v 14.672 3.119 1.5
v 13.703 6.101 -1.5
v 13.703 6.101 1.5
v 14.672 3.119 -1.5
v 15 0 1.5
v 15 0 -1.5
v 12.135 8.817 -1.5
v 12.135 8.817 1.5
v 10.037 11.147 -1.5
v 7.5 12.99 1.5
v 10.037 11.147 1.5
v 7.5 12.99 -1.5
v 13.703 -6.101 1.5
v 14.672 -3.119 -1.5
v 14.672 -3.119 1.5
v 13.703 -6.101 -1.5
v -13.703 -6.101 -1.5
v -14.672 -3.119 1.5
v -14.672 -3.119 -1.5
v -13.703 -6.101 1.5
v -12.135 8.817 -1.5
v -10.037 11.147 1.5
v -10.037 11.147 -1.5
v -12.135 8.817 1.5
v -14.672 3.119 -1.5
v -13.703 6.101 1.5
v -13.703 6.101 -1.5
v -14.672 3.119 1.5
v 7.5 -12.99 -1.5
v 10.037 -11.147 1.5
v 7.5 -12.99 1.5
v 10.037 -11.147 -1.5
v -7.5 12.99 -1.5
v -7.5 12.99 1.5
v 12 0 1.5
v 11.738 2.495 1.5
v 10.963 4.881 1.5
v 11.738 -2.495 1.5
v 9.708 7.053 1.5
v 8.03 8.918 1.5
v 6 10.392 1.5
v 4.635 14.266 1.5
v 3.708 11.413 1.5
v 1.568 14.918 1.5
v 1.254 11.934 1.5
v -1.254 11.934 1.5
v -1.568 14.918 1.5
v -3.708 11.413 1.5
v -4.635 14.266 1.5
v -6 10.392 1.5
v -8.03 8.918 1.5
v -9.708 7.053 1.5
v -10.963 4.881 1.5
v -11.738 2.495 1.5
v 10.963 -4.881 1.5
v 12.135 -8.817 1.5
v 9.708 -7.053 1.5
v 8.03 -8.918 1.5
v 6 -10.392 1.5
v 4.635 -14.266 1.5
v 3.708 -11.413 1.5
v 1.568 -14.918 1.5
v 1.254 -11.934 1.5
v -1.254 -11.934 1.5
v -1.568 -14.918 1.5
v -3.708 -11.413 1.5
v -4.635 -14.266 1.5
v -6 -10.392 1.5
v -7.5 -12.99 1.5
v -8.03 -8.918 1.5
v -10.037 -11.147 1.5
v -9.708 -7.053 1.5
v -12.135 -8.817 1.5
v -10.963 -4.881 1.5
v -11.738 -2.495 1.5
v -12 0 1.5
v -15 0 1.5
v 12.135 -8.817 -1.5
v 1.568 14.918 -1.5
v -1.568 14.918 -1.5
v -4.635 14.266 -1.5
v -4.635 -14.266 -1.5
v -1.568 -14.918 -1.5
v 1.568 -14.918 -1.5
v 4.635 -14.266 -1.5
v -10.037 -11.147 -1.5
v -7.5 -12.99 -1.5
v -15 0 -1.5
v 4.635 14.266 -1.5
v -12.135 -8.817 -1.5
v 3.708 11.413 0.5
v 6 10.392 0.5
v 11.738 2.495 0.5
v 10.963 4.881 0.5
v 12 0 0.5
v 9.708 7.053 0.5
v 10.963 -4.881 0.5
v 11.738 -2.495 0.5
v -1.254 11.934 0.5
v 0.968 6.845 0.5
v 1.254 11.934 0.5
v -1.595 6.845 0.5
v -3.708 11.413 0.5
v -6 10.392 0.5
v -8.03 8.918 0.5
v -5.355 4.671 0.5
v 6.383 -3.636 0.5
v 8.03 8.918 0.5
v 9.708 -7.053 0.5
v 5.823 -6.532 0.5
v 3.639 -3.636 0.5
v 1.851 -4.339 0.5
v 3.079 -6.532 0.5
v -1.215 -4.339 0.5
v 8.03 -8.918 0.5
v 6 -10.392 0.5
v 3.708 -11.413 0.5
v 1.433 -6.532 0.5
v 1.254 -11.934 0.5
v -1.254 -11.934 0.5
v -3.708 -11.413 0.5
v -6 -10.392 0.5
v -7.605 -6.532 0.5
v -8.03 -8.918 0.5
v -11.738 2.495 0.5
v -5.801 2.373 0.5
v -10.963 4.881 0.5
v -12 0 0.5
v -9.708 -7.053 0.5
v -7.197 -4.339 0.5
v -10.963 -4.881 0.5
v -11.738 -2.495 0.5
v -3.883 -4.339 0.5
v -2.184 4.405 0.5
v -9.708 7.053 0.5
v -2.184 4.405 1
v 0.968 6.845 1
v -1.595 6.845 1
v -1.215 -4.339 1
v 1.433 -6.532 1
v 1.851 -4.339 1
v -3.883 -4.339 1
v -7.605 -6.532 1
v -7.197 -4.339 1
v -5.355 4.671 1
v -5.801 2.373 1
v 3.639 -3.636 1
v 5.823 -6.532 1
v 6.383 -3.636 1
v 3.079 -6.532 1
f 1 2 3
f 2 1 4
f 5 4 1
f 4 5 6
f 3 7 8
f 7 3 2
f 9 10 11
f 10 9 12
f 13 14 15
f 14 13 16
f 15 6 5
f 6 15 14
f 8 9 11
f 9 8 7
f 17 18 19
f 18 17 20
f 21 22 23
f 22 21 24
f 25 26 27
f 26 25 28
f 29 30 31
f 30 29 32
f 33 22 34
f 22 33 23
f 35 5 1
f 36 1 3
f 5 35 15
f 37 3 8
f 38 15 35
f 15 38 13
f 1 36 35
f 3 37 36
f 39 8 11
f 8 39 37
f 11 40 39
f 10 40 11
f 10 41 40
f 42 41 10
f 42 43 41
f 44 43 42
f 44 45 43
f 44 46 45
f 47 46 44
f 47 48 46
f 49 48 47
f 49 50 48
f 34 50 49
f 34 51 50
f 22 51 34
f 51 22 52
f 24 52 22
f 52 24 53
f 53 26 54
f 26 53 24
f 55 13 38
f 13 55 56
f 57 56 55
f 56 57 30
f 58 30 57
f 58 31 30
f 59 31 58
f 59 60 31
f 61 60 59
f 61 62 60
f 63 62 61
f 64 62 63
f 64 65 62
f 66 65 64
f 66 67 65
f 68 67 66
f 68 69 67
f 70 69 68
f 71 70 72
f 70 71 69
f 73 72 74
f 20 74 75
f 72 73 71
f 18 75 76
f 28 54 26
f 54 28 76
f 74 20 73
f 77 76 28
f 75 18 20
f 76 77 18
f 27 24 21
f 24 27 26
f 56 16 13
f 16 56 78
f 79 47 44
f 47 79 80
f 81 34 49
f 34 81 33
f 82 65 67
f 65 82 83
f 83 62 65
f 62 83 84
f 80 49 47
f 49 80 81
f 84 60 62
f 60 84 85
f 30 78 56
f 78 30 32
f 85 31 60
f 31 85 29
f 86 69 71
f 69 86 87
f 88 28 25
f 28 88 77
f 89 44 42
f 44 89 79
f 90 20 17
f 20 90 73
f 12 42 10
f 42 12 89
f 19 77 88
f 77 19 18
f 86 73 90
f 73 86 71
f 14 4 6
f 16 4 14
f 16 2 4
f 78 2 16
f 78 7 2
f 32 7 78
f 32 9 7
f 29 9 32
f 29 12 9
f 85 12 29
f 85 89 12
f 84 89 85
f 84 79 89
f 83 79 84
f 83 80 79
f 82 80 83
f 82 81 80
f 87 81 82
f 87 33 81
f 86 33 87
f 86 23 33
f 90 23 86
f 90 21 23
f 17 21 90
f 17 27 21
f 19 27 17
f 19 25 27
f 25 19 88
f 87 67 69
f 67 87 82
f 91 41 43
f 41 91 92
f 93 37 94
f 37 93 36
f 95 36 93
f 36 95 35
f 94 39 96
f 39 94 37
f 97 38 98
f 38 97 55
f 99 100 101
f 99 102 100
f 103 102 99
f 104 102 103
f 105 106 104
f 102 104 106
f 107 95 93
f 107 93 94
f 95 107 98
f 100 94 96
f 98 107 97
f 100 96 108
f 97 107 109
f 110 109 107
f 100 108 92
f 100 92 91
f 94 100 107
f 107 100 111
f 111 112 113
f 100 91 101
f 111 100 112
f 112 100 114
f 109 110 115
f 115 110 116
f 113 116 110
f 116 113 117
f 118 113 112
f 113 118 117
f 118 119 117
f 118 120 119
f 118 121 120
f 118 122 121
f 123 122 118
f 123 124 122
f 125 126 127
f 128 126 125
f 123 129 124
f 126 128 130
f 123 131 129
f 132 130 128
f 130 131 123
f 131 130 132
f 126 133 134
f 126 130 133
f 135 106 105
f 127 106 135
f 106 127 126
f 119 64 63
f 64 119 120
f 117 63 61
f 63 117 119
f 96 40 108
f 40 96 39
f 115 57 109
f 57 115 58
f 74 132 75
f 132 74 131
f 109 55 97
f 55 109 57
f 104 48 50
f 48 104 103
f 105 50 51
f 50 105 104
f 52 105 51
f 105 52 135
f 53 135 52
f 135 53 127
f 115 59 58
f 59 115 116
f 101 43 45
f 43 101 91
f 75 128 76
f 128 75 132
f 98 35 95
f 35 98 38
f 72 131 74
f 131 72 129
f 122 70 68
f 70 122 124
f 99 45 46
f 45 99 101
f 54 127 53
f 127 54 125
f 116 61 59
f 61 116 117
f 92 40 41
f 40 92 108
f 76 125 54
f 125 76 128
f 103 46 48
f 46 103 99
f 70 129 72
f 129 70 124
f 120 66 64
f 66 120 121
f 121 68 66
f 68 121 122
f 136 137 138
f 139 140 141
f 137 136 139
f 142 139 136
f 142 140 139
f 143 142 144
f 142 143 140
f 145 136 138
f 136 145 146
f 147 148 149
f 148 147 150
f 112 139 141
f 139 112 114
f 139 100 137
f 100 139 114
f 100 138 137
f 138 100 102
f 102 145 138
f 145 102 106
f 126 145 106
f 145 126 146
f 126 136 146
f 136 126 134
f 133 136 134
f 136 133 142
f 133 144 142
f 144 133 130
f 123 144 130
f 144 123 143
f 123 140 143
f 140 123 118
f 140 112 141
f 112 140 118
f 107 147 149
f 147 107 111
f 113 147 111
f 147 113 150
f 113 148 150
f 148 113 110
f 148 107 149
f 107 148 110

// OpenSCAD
//$fn = 72;

height = 3;
radius = 15;
thickness = 3;
depth = 1;
font = "Liberation Sans:style=Bold Italic";
size = 14;
singleSided = true;

text = "1.";

difference() {
    cylinder(h=height, r1=radius, r2=radius, center=true);
    translate([0, 0, (height - depth)/2]) cylinder(h=depth, r1=radius-thickness, r2=radius-thickness, center=true);
    if (singleSided == false) {
        translate([0, 0, -(height - depth)/2]) cylinder(h=depth, r1=radius-thickness, r2=radius-thickness, center=true);
    }
}

linear_extrude(height / 3) text(text=text, font=font, size=size, valign="center", halign="center");
rotate([180, 0, 0]) linear_extrude(height/2) text(text=text, font=font, size=size, valign="center", halign="center");
